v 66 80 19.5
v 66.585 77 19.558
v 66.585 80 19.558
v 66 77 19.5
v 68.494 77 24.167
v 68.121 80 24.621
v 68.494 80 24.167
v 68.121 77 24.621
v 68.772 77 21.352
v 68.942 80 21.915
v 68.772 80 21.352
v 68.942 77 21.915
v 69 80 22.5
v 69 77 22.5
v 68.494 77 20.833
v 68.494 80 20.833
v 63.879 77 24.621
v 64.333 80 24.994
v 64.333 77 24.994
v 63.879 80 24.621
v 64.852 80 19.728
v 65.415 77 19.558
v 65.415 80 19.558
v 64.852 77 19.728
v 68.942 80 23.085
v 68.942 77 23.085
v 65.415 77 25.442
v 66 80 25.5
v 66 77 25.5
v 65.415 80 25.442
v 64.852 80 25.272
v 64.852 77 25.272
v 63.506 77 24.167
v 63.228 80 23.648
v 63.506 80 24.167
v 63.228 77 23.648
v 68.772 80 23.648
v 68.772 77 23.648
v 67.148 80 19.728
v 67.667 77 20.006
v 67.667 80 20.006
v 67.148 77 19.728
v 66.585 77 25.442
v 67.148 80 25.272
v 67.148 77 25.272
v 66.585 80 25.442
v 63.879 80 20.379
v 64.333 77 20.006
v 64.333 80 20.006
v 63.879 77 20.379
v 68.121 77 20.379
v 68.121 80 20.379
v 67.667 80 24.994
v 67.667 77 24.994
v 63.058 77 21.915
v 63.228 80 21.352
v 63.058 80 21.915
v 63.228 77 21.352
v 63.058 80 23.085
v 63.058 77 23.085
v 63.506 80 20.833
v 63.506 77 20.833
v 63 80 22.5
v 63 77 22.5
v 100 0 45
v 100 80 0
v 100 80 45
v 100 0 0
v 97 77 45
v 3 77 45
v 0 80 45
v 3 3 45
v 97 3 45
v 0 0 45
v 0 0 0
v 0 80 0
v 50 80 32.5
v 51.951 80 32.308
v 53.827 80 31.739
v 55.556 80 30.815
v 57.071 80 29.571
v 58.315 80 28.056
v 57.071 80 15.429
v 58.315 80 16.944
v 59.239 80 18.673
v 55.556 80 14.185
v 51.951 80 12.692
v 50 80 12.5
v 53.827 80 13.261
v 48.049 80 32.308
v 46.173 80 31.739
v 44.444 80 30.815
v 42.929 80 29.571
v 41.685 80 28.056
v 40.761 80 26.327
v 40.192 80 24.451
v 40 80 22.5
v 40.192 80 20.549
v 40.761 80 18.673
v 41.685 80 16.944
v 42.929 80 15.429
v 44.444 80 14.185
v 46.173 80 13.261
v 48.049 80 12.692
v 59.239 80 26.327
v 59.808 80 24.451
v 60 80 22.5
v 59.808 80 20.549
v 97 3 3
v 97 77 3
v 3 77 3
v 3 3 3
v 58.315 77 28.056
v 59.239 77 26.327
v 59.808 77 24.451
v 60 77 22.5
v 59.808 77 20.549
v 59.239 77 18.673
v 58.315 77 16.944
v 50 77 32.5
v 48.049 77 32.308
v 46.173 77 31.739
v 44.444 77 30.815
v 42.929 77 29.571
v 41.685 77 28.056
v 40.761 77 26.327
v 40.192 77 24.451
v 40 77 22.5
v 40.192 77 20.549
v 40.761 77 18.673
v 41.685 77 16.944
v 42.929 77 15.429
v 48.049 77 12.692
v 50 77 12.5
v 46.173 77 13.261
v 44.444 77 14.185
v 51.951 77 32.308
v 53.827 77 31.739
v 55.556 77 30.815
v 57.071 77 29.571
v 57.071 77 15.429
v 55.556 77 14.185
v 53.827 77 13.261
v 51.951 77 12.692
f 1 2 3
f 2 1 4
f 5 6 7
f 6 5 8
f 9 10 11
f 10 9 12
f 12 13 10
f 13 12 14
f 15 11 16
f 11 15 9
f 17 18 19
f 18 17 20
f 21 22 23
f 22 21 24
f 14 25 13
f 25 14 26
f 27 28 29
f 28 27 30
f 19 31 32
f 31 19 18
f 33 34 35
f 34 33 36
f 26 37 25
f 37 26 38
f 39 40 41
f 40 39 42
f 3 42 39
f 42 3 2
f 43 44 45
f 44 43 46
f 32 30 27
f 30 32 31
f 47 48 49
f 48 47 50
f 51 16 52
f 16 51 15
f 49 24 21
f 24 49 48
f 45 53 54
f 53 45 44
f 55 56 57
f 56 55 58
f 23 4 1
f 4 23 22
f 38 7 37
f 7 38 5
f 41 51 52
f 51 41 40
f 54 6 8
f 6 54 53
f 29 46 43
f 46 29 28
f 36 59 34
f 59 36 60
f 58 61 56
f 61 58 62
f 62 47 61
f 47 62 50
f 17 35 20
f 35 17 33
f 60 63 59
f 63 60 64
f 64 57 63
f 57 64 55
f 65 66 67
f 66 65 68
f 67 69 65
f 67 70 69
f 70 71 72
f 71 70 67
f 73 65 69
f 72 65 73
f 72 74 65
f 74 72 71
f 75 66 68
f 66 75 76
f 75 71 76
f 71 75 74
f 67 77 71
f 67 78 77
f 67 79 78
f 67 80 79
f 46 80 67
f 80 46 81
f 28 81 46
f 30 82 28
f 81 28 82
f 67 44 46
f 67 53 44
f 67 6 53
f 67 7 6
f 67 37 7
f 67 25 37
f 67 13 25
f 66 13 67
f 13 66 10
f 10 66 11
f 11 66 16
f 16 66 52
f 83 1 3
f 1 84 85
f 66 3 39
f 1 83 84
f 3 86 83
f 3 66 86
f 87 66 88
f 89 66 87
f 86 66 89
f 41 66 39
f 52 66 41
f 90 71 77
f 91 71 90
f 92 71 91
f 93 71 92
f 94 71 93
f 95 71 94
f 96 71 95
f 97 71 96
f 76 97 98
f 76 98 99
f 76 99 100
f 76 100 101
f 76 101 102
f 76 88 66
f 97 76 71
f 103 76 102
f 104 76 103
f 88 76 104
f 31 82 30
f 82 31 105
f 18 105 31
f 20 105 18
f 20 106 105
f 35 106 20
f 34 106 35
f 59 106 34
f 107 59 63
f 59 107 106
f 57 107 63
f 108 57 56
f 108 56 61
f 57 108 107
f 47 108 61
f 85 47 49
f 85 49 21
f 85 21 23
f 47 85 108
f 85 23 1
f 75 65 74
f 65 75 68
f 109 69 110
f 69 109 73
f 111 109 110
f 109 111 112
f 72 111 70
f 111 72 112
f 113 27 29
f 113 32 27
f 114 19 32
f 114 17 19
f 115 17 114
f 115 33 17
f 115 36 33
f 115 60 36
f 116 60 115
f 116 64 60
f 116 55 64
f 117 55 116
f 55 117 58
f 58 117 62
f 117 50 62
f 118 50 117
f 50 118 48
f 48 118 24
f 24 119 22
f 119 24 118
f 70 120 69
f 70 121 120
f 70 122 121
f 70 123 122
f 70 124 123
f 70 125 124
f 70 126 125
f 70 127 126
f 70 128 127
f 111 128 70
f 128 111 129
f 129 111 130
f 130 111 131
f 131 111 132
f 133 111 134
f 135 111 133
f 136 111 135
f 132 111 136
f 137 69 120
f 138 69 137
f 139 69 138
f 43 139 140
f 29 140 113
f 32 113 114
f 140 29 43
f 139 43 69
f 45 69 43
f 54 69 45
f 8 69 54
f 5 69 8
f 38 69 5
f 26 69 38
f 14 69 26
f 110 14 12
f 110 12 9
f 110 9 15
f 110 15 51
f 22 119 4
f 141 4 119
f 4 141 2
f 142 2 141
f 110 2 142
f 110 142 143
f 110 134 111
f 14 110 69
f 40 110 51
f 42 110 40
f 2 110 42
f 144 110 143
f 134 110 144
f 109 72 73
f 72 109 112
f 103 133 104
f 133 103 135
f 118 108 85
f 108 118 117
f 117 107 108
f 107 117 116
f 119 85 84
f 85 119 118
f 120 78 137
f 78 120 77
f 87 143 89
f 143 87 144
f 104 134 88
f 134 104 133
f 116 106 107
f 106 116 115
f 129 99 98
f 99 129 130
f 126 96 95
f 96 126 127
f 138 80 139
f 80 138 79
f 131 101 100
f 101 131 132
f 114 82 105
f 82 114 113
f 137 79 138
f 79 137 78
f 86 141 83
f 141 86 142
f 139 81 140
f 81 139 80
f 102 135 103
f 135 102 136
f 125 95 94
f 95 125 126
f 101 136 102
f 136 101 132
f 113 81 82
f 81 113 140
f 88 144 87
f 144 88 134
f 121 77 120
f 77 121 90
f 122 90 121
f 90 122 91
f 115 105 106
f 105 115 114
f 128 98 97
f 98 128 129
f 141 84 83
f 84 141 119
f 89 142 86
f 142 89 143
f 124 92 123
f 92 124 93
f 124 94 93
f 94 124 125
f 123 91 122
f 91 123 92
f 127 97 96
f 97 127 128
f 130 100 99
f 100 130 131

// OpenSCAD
$fn = 32;

// ----------------------------------------------------------------------
// Vent box: roundvent enclosure
// ----------------------------------------------------------------------

// --- parameters (mm) ---
box_l = 100;              // box length, X
box_w = 80;               // box width, Y
box_h = 45;               // box height, Z
wall_t = 3;               // shell wall thickness
vent_d = 20;              // central vent diameter
ring_d = 6;               // ring hole diameter
n_ring = 6;               // holes in the ring
ring_r = 16;              // ring radius

ring_step = 360 / n_ring;  // ring hole angular step

difference() {
  cube([box_l, box_w, box_h]);
  translate([wall_t, wall_t, wall_t])
    cube([box_l - 2 * wall_t, box_w - 2 * wall_t, box_h]);
  translate([box_l / 2, box_w - wall_t - 1, box_h / 2])
    rotate([-90, 0, 0]) cylinder(h = wall_t + 2, d = vent_d);
  for (i = [0 : n_ring - 1])
    translate([box_l / 2, box_w - wall_t - 1, box_h / 2])
      rotate([0, 0, i * ring_step])
        translate([ring_r, 0, 0]) rotate([-90, 0, 0])
          cylinder(h = wall_t + 2, d = ring_d);
}
